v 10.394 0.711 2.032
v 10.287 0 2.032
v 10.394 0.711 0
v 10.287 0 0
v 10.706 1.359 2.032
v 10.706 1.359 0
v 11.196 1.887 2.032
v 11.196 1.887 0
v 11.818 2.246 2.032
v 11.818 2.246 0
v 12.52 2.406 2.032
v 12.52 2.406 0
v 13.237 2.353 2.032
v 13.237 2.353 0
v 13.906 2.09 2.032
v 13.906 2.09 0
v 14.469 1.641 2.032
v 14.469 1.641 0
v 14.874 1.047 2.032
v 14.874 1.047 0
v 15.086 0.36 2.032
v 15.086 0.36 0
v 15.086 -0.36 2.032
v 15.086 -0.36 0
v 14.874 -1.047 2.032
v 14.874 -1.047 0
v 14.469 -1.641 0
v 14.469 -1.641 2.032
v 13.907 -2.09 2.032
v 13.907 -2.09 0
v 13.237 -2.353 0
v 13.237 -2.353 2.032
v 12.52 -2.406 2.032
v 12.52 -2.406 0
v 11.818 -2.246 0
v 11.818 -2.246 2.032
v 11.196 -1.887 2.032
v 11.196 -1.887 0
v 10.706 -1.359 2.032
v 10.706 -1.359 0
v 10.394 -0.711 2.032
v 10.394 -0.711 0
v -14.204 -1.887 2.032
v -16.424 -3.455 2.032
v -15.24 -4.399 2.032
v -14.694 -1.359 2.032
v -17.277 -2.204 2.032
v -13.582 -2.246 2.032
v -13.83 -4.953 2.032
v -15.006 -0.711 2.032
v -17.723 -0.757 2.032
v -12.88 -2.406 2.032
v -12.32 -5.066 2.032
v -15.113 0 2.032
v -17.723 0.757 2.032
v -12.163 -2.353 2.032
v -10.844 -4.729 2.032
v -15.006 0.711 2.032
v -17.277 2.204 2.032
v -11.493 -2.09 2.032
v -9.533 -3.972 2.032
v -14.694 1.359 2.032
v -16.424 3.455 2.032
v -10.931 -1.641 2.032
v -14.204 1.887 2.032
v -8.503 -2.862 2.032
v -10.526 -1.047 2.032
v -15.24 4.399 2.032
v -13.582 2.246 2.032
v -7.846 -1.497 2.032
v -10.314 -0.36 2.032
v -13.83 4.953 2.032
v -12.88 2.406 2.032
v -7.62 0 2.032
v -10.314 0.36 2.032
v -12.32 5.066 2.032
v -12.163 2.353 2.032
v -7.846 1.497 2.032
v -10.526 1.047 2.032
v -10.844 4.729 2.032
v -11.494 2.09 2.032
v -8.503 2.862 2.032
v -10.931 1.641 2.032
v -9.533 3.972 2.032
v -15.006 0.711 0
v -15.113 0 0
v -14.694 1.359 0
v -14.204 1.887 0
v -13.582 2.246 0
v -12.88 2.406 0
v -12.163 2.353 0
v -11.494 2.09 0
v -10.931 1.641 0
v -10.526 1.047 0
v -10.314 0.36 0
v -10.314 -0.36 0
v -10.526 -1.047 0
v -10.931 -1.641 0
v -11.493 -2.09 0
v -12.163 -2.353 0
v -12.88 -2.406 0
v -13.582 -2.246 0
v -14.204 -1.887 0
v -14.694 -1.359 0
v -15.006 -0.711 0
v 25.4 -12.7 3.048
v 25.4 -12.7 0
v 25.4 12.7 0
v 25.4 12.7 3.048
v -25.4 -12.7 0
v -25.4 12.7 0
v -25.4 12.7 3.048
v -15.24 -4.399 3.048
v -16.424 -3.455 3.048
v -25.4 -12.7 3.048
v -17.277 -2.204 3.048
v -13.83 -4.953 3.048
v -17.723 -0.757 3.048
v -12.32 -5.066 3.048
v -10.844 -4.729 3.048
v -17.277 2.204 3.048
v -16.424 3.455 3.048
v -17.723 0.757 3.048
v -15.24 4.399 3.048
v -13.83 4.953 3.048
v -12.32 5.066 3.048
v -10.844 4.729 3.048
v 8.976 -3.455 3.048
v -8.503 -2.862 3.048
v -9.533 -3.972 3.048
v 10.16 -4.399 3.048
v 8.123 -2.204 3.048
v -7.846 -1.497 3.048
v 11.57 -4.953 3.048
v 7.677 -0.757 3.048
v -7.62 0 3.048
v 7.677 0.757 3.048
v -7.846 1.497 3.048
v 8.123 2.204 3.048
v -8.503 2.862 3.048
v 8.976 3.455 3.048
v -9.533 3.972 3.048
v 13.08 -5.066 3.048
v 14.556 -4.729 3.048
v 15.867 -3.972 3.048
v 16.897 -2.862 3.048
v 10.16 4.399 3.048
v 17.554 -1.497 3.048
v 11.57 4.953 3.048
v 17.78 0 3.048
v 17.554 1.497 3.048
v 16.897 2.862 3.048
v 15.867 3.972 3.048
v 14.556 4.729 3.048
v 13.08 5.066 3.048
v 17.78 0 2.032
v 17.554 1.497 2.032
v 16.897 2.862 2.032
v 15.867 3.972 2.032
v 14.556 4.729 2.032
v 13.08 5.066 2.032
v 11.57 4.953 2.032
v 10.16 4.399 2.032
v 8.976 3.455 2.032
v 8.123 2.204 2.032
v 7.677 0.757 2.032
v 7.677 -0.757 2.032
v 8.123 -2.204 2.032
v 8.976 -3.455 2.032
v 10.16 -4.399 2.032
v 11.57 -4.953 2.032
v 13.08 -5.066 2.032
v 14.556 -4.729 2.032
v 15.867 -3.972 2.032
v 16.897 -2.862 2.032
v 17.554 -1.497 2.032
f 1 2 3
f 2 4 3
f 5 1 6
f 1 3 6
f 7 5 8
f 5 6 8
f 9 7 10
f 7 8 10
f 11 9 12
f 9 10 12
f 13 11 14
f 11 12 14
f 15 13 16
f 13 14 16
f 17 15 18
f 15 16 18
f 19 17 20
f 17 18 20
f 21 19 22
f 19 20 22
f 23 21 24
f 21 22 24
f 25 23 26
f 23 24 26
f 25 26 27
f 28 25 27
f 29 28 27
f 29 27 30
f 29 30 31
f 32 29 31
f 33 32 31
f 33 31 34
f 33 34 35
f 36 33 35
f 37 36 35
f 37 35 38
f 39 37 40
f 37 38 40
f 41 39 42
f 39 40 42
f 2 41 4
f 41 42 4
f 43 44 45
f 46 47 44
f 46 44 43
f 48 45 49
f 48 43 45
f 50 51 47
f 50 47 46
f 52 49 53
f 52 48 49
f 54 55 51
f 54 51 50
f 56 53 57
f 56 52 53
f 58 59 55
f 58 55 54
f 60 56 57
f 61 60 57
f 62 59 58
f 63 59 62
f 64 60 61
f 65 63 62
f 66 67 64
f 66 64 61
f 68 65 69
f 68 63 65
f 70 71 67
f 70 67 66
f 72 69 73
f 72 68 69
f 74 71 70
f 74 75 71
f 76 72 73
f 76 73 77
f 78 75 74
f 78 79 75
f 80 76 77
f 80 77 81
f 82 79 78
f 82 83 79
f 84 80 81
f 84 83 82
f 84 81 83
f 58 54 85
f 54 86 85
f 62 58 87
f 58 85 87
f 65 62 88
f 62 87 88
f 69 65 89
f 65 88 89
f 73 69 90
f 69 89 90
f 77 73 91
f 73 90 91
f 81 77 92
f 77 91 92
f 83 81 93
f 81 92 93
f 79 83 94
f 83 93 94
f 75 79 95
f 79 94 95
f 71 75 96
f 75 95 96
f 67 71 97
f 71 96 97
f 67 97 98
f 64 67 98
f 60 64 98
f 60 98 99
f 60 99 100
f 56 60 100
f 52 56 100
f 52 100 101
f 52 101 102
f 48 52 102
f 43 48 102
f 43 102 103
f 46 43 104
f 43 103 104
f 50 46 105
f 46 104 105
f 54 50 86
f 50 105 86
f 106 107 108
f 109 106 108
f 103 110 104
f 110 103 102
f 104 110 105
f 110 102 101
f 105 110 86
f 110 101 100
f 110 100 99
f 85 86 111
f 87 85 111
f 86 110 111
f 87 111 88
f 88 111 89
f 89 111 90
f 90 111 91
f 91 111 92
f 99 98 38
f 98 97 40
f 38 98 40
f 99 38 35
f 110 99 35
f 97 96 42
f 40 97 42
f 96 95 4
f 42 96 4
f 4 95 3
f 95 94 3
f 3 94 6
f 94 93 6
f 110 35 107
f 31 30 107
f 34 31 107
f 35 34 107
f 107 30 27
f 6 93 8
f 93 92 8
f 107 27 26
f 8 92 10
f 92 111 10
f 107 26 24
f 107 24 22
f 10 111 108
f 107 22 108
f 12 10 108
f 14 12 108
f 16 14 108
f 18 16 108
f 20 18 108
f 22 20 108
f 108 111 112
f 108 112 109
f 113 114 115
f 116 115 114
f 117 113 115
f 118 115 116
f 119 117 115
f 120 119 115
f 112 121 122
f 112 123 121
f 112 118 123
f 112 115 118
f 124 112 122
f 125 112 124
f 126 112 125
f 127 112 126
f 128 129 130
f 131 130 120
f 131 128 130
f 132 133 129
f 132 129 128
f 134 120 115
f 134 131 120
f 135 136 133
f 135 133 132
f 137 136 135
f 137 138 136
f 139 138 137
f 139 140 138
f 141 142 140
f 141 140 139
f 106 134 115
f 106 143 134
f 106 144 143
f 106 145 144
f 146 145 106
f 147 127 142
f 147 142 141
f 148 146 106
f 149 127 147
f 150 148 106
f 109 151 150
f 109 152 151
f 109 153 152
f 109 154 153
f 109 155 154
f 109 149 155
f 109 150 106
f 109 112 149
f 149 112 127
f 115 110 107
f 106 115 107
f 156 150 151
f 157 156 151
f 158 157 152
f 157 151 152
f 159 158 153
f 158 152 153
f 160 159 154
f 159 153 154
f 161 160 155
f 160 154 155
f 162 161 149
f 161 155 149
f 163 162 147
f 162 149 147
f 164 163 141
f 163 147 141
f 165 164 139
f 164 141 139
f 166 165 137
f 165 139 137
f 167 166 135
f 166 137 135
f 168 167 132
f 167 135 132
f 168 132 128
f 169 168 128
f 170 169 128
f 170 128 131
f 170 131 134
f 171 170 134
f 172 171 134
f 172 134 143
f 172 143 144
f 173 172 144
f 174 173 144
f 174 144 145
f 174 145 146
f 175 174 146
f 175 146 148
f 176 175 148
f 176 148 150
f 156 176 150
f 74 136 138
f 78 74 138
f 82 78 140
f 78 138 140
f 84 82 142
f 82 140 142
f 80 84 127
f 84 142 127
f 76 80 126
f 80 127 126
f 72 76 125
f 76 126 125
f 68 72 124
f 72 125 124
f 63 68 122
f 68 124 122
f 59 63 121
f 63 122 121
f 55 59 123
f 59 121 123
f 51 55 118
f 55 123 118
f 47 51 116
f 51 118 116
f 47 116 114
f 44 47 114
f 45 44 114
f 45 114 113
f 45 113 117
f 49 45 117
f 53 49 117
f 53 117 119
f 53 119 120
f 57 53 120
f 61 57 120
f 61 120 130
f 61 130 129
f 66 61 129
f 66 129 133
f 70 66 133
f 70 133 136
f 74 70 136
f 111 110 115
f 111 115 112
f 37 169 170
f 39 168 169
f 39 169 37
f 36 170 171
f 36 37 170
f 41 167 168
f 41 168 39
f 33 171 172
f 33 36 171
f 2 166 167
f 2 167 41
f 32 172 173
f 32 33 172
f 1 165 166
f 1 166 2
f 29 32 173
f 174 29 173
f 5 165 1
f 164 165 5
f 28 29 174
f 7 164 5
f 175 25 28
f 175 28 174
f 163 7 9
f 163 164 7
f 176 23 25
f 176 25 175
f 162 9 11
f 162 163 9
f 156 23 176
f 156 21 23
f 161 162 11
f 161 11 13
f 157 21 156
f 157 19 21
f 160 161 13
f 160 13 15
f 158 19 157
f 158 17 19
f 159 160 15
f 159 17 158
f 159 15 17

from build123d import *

# Parameters (mm, degrees)
SKETCH_W         = 50.8
SKETCH_H         = 25.4
PAD_DEPTH        = 3.048
HOLE_D           = 4.826
HOLE_DEPTH       = 635
HOLE_CBORE_D     = 10.16
HOLE_CBORE_DEPTH = 1.016


with BuildPart() as part:
    # Sketch → Pad (new body)
    with BuildSketch(Plane.XY):
        Rectangle(SKETCH_W, SKETCH_H)
    extrude(amount=PAD_DEPTH)

    # Hole
    with Locations(Plane.XY.offset(3.048)):
        with Locations((-12.7, 0), (12.7, 0)):
            CounterBoreHole(HOLE_D / 2, HOLE_CBORE_D / 2, HOLE_CBORE_DEPTH, depth=HOLE_DEPTH)


solid = part.part
